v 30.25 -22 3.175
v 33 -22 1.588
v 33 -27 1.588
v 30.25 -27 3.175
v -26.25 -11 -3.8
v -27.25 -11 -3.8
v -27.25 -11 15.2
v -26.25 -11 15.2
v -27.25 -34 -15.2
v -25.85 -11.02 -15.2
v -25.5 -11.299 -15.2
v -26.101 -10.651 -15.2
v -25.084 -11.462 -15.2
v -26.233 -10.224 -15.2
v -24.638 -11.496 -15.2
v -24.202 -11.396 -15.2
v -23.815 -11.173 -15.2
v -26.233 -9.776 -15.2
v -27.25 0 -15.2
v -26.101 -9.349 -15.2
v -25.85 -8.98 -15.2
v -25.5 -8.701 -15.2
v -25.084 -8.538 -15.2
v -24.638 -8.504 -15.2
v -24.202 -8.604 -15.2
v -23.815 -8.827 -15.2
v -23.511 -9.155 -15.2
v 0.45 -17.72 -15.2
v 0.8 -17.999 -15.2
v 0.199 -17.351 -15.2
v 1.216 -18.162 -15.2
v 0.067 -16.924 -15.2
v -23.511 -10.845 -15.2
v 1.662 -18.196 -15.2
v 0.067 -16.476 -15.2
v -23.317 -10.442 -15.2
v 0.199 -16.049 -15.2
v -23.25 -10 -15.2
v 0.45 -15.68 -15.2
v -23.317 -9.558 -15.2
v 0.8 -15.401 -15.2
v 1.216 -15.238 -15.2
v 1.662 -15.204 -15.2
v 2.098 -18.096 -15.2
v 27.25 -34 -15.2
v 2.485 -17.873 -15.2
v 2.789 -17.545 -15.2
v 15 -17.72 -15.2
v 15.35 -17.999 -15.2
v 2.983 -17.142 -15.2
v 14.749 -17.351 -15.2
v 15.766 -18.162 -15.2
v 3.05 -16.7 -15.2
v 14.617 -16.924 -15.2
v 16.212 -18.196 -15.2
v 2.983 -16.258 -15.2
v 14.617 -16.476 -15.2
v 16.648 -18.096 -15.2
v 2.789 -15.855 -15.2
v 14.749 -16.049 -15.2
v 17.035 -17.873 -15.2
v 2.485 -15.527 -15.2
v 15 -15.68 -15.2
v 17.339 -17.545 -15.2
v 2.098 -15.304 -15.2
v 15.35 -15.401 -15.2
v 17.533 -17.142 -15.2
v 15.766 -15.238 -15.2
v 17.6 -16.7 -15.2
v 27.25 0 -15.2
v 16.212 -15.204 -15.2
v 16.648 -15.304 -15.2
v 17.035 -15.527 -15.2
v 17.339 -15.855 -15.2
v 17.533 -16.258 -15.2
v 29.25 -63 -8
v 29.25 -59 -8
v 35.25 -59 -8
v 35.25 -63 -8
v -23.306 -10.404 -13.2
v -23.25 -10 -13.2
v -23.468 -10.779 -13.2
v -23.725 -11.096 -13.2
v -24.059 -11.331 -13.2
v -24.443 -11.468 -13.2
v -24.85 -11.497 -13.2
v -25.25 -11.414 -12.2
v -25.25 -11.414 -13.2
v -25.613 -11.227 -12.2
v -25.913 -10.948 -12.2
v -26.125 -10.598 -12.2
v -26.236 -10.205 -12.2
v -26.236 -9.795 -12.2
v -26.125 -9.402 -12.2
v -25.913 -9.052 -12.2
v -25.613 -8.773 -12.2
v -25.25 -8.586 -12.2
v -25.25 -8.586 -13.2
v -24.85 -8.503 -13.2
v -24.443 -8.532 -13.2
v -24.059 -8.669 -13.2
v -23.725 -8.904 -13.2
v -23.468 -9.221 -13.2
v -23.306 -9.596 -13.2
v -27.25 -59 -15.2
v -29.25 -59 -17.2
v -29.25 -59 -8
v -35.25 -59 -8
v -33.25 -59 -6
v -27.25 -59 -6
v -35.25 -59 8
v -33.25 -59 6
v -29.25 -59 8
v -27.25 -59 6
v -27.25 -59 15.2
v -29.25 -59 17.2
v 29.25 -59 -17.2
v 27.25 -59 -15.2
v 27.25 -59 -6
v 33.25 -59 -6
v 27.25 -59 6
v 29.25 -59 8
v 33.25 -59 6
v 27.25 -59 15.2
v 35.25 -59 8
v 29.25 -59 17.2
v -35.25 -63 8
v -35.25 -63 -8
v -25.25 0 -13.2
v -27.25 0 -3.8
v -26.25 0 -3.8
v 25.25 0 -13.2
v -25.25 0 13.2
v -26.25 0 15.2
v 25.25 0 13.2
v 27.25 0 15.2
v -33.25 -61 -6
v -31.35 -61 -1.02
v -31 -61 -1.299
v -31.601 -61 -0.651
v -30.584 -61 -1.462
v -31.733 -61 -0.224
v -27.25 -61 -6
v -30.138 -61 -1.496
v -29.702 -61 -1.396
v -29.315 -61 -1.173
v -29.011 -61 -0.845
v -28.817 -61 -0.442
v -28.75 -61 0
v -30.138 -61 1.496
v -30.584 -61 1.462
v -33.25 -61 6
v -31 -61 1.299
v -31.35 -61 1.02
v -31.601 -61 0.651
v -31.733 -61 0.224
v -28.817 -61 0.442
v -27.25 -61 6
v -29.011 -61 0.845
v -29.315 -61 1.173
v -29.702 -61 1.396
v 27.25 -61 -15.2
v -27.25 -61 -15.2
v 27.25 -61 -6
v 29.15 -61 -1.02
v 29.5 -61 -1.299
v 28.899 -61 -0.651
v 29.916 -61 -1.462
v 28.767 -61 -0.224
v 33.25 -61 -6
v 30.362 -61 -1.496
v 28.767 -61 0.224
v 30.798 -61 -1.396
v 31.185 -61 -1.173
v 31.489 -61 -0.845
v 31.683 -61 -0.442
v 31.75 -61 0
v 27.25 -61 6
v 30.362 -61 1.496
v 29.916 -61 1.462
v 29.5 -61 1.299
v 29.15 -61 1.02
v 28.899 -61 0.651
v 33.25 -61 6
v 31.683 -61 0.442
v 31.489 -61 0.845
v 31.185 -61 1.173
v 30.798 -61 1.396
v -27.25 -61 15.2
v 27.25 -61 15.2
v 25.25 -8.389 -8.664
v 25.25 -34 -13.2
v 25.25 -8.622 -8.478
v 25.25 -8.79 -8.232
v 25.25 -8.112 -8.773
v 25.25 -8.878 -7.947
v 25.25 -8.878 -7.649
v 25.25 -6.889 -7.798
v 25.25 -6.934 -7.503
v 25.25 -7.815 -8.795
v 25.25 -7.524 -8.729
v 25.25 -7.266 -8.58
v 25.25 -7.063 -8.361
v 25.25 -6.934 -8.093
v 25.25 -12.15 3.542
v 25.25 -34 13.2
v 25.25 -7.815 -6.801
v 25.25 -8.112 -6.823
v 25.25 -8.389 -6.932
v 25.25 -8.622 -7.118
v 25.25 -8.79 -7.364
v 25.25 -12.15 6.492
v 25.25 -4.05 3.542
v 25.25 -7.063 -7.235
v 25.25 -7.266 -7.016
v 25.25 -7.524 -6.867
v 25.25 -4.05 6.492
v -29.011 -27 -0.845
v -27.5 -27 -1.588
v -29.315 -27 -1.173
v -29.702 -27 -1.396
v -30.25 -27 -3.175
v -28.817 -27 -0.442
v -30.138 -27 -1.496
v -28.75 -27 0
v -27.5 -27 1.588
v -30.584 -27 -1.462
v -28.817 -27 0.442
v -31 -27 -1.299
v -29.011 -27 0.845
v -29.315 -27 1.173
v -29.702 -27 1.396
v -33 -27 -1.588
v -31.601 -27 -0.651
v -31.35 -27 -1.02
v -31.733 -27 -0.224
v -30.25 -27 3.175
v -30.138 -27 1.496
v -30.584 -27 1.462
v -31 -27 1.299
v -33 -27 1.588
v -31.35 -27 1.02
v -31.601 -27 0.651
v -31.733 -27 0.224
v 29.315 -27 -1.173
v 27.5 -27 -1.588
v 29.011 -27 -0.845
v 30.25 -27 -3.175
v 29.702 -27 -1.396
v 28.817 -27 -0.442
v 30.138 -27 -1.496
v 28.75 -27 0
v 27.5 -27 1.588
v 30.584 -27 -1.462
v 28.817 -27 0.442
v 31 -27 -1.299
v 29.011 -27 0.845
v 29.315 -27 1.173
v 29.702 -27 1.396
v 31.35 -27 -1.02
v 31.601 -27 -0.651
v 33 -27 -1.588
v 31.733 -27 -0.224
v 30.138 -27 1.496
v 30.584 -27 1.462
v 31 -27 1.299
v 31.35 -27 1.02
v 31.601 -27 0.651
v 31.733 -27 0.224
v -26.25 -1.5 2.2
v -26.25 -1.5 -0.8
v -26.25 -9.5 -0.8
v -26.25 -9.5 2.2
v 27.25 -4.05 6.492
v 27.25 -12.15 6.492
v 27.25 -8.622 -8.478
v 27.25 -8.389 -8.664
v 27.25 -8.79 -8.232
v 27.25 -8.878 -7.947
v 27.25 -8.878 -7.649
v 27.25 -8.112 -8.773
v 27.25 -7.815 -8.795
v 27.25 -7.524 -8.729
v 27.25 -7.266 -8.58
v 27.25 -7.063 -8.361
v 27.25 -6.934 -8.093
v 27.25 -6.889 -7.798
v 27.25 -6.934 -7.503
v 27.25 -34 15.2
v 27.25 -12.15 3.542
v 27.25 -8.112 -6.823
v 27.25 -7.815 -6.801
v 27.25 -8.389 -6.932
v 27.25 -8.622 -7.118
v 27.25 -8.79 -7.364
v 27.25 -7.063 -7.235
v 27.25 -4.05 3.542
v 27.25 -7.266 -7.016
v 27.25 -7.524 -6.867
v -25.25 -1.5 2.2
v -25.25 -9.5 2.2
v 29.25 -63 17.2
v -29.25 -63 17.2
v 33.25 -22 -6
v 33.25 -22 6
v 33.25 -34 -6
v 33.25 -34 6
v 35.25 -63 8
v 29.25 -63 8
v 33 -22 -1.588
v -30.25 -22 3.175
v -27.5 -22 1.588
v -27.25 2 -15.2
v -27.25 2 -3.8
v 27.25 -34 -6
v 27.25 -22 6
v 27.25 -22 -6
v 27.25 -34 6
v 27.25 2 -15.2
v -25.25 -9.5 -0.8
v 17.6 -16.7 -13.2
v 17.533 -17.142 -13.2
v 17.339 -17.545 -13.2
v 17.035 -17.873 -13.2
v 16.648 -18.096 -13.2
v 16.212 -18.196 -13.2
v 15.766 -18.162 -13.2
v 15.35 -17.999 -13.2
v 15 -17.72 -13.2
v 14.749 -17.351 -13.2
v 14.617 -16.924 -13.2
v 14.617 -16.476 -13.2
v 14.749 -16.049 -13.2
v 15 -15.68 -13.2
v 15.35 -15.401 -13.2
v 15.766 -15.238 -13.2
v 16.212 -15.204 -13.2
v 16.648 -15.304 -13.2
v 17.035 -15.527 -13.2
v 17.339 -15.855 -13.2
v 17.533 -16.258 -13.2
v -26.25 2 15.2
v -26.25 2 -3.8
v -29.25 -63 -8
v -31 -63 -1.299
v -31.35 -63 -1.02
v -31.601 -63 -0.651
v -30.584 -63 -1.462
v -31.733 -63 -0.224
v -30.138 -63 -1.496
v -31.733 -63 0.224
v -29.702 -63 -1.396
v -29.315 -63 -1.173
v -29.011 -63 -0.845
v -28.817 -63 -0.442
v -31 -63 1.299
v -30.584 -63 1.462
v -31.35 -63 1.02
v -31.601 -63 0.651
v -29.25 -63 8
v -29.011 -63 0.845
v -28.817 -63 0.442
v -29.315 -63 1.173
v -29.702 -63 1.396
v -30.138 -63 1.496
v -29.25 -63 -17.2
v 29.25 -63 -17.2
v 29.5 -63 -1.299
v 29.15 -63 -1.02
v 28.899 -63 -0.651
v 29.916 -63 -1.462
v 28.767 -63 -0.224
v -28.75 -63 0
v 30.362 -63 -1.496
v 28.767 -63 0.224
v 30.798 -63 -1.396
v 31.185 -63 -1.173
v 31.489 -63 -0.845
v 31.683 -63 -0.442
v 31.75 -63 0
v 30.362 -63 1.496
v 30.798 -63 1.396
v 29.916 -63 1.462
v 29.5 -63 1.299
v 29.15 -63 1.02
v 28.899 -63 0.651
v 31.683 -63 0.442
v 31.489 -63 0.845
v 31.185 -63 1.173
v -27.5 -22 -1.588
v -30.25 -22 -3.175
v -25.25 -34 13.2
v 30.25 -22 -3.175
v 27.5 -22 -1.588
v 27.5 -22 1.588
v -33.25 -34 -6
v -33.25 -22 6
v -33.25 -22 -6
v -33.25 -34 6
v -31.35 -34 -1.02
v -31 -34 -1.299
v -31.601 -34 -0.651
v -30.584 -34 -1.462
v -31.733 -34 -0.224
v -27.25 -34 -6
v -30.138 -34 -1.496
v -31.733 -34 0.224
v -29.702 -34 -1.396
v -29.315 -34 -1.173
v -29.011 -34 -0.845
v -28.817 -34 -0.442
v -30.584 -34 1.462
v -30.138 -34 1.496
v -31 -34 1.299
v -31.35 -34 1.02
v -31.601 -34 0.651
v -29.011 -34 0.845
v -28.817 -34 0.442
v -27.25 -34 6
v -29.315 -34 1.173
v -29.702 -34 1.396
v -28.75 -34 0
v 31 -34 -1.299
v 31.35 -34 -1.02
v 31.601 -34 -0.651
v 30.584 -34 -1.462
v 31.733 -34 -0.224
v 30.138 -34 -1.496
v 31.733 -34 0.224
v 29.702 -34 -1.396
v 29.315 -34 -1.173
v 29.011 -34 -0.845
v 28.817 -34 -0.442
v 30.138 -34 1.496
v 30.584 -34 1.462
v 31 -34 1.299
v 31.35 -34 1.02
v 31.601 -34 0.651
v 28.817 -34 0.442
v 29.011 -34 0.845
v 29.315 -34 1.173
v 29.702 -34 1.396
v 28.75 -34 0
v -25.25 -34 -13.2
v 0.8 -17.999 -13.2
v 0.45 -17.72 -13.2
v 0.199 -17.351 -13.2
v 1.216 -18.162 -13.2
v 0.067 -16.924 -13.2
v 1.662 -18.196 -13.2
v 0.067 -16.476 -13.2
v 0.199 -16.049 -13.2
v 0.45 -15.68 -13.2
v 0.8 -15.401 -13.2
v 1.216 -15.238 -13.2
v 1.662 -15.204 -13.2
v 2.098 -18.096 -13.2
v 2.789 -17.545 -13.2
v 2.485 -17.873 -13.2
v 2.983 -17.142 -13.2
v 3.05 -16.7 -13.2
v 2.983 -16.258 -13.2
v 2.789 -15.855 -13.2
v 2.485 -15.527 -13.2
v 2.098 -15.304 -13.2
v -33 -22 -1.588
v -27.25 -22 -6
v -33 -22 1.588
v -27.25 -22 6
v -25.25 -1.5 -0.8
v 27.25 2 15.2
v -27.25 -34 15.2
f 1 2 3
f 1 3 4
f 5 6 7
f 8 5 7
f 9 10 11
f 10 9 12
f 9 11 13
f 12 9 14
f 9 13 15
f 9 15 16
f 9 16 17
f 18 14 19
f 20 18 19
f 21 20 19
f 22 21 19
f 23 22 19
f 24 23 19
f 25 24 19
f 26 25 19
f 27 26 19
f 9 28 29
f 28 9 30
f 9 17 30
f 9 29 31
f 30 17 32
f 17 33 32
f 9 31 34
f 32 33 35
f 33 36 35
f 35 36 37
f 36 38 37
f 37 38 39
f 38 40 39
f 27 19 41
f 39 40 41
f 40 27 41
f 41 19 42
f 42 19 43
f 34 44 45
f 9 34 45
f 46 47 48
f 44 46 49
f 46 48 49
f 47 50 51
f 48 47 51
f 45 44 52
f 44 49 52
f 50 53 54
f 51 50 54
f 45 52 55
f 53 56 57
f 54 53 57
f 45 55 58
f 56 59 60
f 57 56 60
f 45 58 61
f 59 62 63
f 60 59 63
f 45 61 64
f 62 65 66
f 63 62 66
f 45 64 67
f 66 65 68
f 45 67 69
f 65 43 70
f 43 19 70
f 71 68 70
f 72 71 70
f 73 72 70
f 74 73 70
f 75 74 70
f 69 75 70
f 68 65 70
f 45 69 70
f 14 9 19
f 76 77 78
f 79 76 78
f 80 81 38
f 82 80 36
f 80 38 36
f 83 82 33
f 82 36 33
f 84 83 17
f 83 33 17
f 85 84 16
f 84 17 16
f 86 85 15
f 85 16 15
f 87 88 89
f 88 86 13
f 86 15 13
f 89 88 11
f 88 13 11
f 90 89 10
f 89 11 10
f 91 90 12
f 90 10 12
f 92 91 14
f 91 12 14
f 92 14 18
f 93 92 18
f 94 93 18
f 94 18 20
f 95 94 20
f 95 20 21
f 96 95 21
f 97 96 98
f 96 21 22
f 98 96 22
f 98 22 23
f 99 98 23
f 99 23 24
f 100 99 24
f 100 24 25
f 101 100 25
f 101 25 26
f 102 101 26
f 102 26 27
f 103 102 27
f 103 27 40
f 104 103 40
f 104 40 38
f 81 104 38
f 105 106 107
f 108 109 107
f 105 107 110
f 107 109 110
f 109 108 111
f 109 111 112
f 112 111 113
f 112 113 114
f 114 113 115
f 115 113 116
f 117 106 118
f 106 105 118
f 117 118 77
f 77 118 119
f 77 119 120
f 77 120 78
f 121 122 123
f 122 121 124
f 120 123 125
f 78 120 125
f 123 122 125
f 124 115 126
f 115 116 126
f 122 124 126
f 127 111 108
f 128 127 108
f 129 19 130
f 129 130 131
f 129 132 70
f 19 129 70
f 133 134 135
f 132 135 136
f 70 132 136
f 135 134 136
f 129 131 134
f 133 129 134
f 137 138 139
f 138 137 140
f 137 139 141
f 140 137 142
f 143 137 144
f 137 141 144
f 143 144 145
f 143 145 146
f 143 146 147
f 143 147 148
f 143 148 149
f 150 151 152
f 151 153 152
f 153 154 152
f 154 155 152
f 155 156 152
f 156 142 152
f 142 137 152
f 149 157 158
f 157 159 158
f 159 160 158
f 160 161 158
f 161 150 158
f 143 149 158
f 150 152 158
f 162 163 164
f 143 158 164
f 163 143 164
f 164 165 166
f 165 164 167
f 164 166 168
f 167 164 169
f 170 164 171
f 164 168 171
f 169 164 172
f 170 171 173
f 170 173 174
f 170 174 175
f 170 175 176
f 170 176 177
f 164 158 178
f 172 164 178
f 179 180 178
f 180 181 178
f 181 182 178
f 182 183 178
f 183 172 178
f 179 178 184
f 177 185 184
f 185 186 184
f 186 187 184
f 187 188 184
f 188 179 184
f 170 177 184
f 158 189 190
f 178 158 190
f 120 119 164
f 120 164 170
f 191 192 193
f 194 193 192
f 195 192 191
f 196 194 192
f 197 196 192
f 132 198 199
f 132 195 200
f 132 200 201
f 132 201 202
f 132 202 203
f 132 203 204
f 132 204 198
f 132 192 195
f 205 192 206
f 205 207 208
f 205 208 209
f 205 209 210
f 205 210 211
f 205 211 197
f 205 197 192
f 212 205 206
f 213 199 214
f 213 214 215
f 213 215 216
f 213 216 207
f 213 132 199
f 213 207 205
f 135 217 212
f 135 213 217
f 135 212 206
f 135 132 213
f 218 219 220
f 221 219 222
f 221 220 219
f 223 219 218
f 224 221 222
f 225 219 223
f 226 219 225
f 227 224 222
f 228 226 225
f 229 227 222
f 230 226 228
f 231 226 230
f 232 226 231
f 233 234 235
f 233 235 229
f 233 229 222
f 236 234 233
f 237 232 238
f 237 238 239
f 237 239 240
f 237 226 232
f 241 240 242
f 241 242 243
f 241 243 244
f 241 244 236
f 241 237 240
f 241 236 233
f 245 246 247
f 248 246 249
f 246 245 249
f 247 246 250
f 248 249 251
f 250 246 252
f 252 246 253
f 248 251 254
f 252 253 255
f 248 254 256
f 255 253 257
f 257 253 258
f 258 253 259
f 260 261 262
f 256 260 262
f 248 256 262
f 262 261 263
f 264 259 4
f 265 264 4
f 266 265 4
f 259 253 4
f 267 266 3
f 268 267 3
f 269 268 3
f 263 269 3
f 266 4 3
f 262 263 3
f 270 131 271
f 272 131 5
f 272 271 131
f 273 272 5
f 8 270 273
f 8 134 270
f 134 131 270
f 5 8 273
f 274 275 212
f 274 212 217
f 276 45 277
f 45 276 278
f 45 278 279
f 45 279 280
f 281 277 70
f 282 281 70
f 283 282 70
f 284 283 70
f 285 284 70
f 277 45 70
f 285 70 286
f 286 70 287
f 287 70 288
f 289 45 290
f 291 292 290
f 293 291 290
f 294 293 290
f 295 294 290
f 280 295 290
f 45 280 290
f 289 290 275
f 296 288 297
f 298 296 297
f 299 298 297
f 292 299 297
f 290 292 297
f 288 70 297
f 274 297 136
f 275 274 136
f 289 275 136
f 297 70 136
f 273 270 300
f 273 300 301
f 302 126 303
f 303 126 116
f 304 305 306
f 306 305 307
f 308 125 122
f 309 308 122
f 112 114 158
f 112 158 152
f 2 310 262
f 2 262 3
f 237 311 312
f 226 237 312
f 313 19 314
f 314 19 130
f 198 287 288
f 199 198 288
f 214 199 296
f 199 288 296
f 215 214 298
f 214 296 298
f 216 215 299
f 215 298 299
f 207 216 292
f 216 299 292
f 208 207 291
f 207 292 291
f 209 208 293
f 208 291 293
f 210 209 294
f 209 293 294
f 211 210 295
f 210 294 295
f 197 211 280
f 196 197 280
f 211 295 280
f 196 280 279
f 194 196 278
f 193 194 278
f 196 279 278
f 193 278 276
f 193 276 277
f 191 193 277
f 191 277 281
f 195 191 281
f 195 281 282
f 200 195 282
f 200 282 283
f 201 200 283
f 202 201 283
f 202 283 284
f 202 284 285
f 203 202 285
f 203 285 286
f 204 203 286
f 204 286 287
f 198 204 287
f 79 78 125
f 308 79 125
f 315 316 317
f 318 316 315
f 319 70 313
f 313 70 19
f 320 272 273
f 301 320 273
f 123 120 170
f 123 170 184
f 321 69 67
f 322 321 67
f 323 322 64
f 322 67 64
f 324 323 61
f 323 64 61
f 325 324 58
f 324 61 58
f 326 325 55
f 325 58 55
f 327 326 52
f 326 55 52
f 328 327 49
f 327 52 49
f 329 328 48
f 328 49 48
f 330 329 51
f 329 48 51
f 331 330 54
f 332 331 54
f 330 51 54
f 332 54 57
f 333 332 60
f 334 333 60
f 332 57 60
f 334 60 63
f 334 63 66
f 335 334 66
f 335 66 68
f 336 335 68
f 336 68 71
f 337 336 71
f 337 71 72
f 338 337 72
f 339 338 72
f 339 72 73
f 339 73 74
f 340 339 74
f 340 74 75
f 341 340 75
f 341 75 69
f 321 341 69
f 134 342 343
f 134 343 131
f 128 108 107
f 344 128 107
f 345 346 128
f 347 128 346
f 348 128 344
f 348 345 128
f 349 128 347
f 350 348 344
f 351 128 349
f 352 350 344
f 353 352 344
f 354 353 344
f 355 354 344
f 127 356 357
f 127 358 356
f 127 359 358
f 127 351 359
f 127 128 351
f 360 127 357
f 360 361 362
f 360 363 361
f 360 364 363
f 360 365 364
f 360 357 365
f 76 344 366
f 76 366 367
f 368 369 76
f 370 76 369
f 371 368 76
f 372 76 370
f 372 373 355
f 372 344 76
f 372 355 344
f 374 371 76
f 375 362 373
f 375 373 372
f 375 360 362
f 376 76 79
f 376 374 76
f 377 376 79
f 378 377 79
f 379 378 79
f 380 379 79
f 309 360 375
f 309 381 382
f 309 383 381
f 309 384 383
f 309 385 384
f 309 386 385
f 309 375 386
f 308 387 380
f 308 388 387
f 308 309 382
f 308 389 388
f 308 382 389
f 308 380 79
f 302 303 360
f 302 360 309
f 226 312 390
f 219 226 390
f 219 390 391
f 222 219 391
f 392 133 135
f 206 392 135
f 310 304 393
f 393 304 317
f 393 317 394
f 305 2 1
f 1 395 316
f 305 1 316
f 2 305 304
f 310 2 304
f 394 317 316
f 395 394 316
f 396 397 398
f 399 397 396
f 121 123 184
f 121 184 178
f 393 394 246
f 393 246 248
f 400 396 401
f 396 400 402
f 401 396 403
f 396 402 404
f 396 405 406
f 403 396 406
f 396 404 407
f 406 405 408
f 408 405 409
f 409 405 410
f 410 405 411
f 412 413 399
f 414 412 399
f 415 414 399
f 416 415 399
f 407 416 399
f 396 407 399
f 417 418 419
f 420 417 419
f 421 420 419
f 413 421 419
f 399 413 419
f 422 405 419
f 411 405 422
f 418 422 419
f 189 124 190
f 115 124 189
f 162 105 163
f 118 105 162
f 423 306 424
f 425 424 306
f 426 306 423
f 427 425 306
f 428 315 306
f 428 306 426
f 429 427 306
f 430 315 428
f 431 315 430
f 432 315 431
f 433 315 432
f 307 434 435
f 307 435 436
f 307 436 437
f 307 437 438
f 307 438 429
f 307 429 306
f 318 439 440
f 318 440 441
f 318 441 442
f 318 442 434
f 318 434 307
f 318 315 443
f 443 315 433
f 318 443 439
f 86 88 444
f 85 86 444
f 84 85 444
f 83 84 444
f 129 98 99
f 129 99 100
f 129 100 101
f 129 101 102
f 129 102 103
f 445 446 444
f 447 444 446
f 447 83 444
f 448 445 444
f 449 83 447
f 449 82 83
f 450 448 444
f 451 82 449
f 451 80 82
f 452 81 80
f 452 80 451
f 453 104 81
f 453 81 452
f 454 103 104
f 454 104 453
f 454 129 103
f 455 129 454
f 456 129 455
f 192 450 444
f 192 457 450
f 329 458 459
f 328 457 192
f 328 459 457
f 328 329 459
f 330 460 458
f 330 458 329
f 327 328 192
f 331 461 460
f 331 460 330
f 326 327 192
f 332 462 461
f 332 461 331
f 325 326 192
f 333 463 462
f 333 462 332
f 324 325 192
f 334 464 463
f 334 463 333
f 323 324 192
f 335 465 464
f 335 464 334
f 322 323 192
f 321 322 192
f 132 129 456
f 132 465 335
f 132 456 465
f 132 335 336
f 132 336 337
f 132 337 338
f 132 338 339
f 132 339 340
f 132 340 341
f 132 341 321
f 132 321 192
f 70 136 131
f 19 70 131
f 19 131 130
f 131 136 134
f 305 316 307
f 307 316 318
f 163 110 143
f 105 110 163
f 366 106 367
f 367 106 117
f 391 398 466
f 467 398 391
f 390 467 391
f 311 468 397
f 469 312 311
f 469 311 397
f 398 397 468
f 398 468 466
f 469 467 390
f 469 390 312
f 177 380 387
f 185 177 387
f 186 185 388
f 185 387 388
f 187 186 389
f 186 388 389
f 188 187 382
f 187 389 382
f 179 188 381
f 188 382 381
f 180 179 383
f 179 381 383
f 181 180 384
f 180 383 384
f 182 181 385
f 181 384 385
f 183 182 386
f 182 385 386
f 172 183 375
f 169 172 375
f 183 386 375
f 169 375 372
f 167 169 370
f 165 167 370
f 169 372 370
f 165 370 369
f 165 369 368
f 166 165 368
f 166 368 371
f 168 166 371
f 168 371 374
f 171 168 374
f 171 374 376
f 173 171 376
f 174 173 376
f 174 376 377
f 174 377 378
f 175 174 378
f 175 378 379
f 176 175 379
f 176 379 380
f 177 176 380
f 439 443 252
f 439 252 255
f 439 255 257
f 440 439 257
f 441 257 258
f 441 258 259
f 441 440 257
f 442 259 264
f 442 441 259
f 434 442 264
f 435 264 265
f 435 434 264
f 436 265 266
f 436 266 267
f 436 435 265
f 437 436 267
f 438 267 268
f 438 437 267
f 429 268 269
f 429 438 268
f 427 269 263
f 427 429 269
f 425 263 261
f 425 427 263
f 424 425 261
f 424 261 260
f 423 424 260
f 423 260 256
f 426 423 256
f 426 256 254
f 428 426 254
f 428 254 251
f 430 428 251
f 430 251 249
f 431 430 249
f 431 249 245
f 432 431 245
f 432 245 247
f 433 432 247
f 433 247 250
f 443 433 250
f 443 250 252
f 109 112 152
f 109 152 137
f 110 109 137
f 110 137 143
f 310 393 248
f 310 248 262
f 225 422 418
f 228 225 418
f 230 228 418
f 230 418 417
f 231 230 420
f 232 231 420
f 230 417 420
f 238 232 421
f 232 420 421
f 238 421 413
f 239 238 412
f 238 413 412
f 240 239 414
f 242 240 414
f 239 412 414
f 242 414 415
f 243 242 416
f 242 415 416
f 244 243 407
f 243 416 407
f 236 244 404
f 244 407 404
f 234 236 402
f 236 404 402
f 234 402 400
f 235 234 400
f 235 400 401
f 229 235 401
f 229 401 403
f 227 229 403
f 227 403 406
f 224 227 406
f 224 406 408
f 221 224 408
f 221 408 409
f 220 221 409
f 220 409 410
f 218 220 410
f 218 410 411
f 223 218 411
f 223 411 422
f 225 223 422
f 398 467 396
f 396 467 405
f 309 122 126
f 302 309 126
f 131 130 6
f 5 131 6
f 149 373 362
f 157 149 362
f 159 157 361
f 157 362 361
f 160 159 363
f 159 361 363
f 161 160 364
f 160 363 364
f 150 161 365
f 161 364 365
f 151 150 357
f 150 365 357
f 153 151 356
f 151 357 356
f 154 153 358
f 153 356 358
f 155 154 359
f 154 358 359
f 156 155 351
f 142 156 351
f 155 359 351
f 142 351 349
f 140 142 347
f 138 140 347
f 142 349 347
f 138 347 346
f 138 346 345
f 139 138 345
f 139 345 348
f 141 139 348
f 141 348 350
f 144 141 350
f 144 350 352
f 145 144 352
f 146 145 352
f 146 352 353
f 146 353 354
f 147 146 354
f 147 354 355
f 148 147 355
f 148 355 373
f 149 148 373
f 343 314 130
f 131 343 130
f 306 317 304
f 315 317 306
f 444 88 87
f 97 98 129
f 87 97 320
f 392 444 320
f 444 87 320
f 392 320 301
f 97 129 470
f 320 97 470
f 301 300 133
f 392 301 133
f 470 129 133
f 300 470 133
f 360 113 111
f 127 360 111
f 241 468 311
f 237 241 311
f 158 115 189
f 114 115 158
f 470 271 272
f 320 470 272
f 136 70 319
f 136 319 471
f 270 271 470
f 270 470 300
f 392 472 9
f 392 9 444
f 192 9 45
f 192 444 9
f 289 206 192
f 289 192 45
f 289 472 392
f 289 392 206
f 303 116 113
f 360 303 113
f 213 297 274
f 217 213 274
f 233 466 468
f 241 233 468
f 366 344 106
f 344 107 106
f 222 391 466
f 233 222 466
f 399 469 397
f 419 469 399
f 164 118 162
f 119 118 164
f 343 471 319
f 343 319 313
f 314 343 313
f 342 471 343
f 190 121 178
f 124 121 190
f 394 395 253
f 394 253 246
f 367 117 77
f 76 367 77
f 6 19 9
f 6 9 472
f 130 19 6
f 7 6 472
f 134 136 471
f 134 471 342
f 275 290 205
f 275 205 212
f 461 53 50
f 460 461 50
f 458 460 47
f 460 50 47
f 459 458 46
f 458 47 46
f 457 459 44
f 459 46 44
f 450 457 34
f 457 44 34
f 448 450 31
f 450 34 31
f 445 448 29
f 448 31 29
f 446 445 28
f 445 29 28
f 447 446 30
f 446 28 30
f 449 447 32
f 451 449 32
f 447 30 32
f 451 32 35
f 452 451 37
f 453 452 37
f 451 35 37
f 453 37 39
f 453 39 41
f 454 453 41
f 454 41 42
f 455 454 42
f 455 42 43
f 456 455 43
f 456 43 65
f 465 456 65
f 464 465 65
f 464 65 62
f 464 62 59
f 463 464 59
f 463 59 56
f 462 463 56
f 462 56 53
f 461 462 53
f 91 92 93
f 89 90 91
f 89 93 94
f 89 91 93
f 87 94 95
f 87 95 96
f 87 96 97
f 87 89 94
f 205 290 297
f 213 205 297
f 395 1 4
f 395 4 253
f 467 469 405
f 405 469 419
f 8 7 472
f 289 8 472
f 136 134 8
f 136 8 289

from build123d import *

# Parameters (mm, degrees)
F0_W      = 54.5
F0_H      = 30.4
F0_W_2    = 50.5
F0_H_2    = 26.4
F1_DEPTH  = 34
F2_W      = 54.5
F2_H      = 30.4
F3_DEPTH  = 2
F4_W      = 12
F4_H      = 12
F5_DEPTH  = 6
F6_R      = 1.5
F7_DEPTH  = 15
F8_R      = 1.5
F9_DEPTH  = 5
F13_DEPTH = 2
F14_T     = 2
F15_R     = 1.5
F16_DEPTH = 3
F17_R     = 1.5
F18_DEPTH = 3
F19_W     = 13
F19_H     = 19
F20_DEPTH = 1
F22_W     = 8.1
F22_H     = 2.95
F23_DEPTH = 5
F24_R     = 1
F25_DEPTH = 5
F26_W     = 8
F26_H     = 3
F27_DEPTH = 5


with BuildPart() as f1:
    # F0 (on Front) → F1 (new body)
    with BuildSketch(Plane.XZ):
        Rectangle(F0_W, F0_H)
        Rectangle(F0_W_2, F0_H_2, mode=Mode.SUBTRACT)
    extrude(amount=F1_DEPTH)

    # F17 (on face) → F18 (cut)
    with BuildSketch(Plane(origin=(0, 0, -15.2), x_dir=(1, 0, 0), z_dir=(0, 0, -1))):
        with Locations((16.1, 16.7)):
            Circle(F17_R)
        with Locations((1.55, 16.7)):
            Circle(F17_R)
        with Locations((-24.75, 10)):
            Circle(F17_R)
    extrude(amount=-F18_DEPTH, mode=Mode.SUBTRACT)


with BuildPart() as f3:
    # F2 (on face) → F3 (new body)
    with BuildSketch(Plane(origin=(0, 0, 0), x_dir=(-1, 0, 0), z_dir=(0, 1, 0))):
        Rectangle(F2_W, F2_H)
    extrude(amount=F3_DEPTH)


with BuildPart() as f5:
    # F4 (on face) → F5 (new body)
    with BuildSketch(Plane(origin=(-27.25, 0, 0), x_dir=(0, -1, 0), z_dir=(-1, 0, 0))):
        with Locations((28, 0)):
            Rectangle(F4_W, F4_H)
    extrude(amount=F5_DEPTH)

    # F6 (on face) → F7 (cut)
    with BuildSketch(Plane.XZ.offset(34)):
        with Locations((-30.25, 0)):
            Circle(F6_R)
    extrude(amount=-F7_DEPTH, mode=Mode.SUBTRACT)

    # F8 (on face) → F9 (cut)
    with BuildSketch(Plane(origin=(0, -22, 0), x_dir=(-1, 0, 0), z_dir=(0, 1, 0))):
        Polygon((27.5, -1.5877132403), (30.25, -3.1754264805), (33, -1.5877132403), (33, 1.5877132403), (30.25, 3.1754264805), (27.5, 1.5877132403), align=None)
        with Locations((30.25, 0)):
            Circle(F8_R, mode=Mode.SUBTRACT)
    extrude(amount=-F9_DEPTH, mode=Mode.SUBTRACT)


with BuildPart() as f10_1:
    # F10: instance of F5
    add(f5.part.mirror(Plane.YZ))


with BuildPart() as f13:
    # F12 (on offset) → F13 (new body)
    with BuildSketch(Plane.XZ.offset(59)):
        Polygon((-27.25, -15.2), (27.25, -15.2), (27.25, -6), (33.25, -6), (33.25, 6), (27.25, 6), (27.25, 15.2), (-27.25, 15.2), (-27.25, 6), (-33.25, 6), (-33.25, -6), (-27.25, -6), align=None)
    extrude(amount=F13_DEPTH)

    # F14
    f14_openings = [f13.faces().sort_by_distance(p)[0] for p in [
        (0, -59, 0),
    ]]
    offset(amount=F14_T, openings=f14_openings, kind=Kind.INTERSECTION)

    # F15 (on face) → F16 (cut)
    with BuildSketch(Plane.XZ.offset(63)):
        with Locations((-30.25, 0)):
            Circle(F15_R)
        with Locations((30.25, 0)):
            Circle(F15_R)
    extrude(amount=-F16_DEPTH, mode=Mode.SUBTRACT)


with BuildPart() as f20_tool:
    # F19 (on face) → F20 (new body)
    with BuildSketch(Plane(origin=(-27.25, 0, 0), x_dir=(0, -1, 0), z_dir=(-1, 0, 0))):
        with Locations((4.5, 5.7)):
            Rectangle(F19_W, F19_H)
    extrude(amount=-F20_DEPTH)


with BuildPart() as f1_1:
    add(f1.part)

    # F20: cut by f20_tool
    add(f20_tool.part, mode=Mode.SUBTRACT)

    # F22 (on face) → F23 (cut)
    with BuildSketch(Plane.YZ.offset(27.25)):
        with Locations((-8.1001479298, 5.0171468783)):
            Rectangle(F22_W, F22_H)
    extrude(amount=-F23_DEPTH, mode=Mode.SUBTRACT)

    # F24 (on face) → F25 (cut)
    with BuildSketch(Plane.YZ.offset(27.25)):
        with Locations((-7.8892959282, -7.7980095521)):
            Circle(F24_R)
    extrude(amount=-F25_DEPTH, mode=Mode.SUBTRACT)

    # F26 (on face) → F27 (cut)
    with BuildSketch(Plane(origin=(-26.25, 0, 0), x_dir=(0, -1, 0), z_dir=(-1, 0, 0))):
        with Locations((5.5, 0.7)):
            Rectangle(F26_W, F26_H)
    extrude(amount=-F27_DEPTH, mode=Mode.SUBTRACT)


with BuildPart() as f3_1:
    add(f3.part)

    # F20: cut by f20_tool
    add(f20_tool.part, mode=Mode.SUBTRACT)


solid = Compound([f5.part, f10_1.part, f13.part, f1_1.part, f3_1.part])
